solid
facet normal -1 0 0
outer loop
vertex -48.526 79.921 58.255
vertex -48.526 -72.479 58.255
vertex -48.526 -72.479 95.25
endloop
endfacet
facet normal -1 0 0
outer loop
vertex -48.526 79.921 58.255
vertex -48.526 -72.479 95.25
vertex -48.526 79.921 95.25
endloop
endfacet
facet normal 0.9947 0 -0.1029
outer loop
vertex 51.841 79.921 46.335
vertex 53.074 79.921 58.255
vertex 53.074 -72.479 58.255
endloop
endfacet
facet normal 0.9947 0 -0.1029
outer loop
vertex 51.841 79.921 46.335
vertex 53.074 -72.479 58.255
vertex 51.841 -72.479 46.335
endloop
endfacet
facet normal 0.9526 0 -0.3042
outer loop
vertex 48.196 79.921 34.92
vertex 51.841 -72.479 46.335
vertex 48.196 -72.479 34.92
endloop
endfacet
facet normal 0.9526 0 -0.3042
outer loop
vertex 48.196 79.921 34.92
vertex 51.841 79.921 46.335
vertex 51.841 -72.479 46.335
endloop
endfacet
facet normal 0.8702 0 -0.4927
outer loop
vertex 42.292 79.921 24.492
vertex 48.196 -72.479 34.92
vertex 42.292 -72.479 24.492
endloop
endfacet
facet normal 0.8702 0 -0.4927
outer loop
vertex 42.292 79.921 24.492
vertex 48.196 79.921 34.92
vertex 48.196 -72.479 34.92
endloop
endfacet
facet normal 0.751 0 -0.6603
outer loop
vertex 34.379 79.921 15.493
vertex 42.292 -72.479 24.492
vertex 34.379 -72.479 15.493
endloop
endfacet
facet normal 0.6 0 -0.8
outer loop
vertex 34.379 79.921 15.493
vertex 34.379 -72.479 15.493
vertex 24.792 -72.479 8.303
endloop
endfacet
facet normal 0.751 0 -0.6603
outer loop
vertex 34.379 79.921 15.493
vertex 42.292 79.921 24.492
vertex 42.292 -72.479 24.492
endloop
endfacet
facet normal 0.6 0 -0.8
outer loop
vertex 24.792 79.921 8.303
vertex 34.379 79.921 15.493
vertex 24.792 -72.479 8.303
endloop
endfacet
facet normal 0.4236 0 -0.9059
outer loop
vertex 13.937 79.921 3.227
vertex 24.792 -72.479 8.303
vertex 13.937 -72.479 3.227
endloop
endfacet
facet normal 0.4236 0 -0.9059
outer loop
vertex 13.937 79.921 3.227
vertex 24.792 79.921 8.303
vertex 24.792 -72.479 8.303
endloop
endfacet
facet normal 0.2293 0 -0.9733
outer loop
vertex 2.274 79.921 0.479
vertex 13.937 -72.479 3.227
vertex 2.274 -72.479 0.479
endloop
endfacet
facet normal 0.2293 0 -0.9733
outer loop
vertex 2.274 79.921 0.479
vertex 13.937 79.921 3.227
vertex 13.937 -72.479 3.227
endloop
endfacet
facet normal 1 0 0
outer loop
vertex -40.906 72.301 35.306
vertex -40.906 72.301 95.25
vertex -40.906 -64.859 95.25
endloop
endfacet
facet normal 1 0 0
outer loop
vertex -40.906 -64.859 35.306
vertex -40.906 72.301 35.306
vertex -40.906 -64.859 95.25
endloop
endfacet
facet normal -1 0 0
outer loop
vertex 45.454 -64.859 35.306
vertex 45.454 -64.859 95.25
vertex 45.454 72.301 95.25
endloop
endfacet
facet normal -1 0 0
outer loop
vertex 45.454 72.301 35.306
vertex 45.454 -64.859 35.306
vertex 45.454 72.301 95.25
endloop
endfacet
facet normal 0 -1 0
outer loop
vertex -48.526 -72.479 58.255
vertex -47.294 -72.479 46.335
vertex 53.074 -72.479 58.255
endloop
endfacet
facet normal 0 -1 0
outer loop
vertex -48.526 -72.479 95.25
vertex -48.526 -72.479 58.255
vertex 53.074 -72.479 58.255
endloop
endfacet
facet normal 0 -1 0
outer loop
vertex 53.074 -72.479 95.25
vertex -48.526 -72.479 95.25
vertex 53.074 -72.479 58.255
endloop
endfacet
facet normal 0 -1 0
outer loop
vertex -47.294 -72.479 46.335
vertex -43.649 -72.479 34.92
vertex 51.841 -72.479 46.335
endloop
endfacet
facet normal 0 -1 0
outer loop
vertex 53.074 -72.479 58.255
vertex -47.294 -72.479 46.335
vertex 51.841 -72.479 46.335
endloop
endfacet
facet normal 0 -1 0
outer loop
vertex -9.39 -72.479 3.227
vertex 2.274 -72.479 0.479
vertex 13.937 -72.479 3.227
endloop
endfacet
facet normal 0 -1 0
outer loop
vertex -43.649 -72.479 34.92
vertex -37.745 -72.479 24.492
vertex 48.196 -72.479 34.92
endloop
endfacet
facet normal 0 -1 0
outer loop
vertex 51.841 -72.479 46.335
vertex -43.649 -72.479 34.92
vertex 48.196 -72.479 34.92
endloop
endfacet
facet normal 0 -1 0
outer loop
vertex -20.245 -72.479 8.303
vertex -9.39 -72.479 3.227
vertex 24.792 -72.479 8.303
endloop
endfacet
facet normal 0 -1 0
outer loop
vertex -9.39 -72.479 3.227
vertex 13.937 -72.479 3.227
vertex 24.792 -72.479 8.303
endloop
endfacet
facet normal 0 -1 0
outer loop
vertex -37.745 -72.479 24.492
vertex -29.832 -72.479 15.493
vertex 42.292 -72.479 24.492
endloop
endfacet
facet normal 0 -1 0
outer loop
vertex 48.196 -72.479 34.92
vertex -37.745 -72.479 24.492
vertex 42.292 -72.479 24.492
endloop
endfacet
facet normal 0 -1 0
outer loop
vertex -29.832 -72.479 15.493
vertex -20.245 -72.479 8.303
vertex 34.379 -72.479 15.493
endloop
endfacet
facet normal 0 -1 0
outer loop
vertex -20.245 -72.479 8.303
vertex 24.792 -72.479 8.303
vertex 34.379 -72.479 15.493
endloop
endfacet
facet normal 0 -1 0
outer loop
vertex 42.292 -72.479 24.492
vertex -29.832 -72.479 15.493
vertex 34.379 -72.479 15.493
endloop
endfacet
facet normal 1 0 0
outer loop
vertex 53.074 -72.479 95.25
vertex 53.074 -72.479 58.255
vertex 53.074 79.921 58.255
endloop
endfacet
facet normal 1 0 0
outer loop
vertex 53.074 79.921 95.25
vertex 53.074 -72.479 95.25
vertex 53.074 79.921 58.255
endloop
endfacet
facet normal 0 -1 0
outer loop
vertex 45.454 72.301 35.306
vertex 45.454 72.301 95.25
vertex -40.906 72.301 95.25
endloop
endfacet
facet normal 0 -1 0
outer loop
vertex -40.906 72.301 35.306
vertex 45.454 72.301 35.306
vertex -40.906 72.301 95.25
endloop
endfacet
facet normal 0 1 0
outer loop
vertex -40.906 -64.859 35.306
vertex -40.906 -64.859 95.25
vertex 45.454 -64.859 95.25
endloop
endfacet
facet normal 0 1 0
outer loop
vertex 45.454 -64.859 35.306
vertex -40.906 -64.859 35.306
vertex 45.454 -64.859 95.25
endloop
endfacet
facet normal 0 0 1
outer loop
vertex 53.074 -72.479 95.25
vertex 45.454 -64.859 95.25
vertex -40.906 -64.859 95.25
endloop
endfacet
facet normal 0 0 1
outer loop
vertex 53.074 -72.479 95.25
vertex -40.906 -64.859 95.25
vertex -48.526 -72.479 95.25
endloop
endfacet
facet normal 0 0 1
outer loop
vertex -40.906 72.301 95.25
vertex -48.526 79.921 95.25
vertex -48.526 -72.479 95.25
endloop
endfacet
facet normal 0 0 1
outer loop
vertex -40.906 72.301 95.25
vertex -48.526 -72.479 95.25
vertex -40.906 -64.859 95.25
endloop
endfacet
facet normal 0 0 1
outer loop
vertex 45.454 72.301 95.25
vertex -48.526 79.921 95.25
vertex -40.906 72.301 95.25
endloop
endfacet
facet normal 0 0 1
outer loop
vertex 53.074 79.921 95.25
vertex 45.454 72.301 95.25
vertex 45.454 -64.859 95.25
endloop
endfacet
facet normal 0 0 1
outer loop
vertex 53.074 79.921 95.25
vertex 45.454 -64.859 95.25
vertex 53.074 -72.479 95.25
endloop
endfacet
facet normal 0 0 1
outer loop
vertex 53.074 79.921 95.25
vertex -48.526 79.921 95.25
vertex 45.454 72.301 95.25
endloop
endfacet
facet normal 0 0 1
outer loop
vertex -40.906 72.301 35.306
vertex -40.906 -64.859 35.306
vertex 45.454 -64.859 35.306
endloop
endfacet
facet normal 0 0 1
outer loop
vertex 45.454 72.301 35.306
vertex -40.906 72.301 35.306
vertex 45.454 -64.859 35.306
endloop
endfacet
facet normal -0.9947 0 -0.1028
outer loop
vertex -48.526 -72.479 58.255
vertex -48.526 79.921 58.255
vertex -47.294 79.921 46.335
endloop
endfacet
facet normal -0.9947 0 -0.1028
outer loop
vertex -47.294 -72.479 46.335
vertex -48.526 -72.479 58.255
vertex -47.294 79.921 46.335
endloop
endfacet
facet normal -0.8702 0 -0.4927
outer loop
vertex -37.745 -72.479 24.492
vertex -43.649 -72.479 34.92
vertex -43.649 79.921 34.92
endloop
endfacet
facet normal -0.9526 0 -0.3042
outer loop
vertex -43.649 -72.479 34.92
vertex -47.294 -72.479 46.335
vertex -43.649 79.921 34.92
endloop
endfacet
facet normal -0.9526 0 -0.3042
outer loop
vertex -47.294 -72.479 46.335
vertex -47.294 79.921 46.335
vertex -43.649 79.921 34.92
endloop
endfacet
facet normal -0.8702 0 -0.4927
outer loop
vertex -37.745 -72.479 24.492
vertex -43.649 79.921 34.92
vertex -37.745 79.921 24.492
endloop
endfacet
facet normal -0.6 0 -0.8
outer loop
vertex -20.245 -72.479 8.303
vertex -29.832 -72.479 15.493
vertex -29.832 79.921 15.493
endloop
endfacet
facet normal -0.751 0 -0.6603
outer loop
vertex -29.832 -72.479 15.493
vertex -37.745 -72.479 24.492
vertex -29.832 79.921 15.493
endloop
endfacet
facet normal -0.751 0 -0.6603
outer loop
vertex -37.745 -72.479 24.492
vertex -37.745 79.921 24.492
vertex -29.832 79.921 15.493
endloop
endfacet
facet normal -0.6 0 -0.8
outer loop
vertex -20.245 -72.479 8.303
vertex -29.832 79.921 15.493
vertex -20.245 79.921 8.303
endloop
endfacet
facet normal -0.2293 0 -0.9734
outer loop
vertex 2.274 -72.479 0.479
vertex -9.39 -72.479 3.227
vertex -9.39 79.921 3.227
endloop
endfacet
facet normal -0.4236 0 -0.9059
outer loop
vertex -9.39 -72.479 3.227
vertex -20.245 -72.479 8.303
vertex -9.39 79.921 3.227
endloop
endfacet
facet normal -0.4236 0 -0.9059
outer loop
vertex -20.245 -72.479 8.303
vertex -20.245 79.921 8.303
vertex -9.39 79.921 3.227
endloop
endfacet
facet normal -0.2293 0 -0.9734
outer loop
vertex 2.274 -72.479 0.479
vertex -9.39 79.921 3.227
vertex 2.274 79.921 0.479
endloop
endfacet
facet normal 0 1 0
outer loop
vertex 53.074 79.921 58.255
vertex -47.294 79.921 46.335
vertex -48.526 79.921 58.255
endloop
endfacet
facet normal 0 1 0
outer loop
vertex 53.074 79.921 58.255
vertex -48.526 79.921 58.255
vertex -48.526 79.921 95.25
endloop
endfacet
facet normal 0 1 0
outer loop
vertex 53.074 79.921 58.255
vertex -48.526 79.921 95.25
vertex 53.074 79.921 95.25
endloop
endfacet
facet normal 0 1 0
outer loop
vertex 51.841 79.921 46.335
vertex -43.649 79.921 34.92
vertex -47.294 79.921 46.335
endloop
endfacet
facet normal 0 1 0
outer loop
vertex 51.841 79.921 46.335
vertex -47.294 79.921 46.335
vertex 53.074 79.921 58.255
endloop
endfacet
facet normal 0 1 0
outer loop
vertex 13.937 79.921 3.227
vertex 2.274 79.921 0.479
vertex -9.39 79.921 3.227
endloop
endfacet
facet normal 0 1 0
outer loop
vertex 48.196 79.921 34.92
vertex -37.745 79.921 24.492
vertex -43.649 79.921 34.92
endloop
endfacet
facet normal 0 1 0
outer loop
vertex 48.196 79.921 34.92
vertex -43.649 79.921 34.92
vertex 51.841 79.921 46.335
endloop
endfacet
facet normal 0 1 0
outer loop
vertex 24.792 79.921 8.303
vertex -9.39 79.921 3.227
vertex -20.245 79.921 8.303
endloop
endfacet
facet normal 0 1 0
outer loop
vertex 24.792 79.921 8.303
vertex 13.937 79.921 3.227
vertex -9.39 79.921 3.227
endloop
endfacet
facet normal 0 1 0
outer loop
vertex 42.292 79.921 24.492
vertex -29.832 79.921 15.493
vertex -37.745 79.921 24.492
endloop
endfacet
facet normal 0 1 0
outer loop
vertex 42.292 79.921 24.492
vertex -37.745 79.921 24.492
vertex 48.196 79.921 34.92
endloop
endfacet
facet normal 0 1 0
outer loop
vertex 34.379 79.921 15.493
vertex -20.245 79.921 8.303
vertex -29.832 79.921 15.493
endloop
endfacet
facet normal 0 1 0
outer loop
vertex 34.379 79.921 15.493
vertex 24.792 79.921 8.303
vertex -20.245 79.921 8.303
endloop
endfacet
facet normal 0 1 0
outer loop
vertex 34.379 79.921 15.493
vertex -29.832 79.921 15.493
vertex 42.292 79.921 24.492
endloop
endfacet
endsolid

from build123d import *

# Parameters (mm, degrees)
F0_W        = 101.6
F0_H        = 152.4
F1_DEPTH    = 95.25
F2_T1_DEPTH = 443.6748663003
F4_DEPTH    = 59.944


# Not quite as in the source:
# - a fillet or chamfer that OpenCascade refuses, or shapes differently, is made with other operations: its cross-section is extruded or revolved along the edge and cut away or added


with BuildPart() as f1:
    # F0 (on Top) → F1 (new body)
    with BuildSketch(Plane.XY):
        with Locations((2.2735033583, 3.7213955075)):
            Rectangle(F0_W, F0_H)
    extrude(amount=F1_DEPTH)

    # F2: fillet of radius 58.2549732601 on 2 edges, made by hand

    # F2_s2 → F2_t1 (cut)
    with BuildSketch(Plane.XZ.offset(-225.5588286576)):
        with BuildLine():
            ThreePointArc((-48.5264966417, 58.2549732601), (-31.4640100116, 17.06248663), (9.7284766184, 0))
            Line((9.7284766184, 0), (-48.5264966417, 0))
            Line((-48.5264966417, 0), (-48.5264966417, 58.2549732601))
        make_face()
        with BuildLine():
            ThreePointArc((53.0735033583, 58.2549732601), (36.0110167283, 17.06248663), (-5.1814699017, 0))
            Line((-5.1814699017, 0), (53.0735033583, 0))
            Line((53.0735033583, 0), (53.0735033583, 58.2549732601))
        make_face()
    extrude(amount=F2_T1_DEPTH, mode=Mode.SUBTRACT)

    # F3 (on face) → F4 (cut)
    with BuildSketch(Plane.XY.offset(95.25)):
        Polygon((-40.9064966417, 17.4030140042), (-40.9064966417, -64.8586044925), (45.4535033583, -64.8586044925), (45.4535033583, 17.9895181209), (45.4535033583, 72.3013955075), (-40.9064966417, 72.3013955075), align=None)
    extrude(amount=-F4_DEPTH, mode=Mode.SUBTRACT)


solid = f1.part
